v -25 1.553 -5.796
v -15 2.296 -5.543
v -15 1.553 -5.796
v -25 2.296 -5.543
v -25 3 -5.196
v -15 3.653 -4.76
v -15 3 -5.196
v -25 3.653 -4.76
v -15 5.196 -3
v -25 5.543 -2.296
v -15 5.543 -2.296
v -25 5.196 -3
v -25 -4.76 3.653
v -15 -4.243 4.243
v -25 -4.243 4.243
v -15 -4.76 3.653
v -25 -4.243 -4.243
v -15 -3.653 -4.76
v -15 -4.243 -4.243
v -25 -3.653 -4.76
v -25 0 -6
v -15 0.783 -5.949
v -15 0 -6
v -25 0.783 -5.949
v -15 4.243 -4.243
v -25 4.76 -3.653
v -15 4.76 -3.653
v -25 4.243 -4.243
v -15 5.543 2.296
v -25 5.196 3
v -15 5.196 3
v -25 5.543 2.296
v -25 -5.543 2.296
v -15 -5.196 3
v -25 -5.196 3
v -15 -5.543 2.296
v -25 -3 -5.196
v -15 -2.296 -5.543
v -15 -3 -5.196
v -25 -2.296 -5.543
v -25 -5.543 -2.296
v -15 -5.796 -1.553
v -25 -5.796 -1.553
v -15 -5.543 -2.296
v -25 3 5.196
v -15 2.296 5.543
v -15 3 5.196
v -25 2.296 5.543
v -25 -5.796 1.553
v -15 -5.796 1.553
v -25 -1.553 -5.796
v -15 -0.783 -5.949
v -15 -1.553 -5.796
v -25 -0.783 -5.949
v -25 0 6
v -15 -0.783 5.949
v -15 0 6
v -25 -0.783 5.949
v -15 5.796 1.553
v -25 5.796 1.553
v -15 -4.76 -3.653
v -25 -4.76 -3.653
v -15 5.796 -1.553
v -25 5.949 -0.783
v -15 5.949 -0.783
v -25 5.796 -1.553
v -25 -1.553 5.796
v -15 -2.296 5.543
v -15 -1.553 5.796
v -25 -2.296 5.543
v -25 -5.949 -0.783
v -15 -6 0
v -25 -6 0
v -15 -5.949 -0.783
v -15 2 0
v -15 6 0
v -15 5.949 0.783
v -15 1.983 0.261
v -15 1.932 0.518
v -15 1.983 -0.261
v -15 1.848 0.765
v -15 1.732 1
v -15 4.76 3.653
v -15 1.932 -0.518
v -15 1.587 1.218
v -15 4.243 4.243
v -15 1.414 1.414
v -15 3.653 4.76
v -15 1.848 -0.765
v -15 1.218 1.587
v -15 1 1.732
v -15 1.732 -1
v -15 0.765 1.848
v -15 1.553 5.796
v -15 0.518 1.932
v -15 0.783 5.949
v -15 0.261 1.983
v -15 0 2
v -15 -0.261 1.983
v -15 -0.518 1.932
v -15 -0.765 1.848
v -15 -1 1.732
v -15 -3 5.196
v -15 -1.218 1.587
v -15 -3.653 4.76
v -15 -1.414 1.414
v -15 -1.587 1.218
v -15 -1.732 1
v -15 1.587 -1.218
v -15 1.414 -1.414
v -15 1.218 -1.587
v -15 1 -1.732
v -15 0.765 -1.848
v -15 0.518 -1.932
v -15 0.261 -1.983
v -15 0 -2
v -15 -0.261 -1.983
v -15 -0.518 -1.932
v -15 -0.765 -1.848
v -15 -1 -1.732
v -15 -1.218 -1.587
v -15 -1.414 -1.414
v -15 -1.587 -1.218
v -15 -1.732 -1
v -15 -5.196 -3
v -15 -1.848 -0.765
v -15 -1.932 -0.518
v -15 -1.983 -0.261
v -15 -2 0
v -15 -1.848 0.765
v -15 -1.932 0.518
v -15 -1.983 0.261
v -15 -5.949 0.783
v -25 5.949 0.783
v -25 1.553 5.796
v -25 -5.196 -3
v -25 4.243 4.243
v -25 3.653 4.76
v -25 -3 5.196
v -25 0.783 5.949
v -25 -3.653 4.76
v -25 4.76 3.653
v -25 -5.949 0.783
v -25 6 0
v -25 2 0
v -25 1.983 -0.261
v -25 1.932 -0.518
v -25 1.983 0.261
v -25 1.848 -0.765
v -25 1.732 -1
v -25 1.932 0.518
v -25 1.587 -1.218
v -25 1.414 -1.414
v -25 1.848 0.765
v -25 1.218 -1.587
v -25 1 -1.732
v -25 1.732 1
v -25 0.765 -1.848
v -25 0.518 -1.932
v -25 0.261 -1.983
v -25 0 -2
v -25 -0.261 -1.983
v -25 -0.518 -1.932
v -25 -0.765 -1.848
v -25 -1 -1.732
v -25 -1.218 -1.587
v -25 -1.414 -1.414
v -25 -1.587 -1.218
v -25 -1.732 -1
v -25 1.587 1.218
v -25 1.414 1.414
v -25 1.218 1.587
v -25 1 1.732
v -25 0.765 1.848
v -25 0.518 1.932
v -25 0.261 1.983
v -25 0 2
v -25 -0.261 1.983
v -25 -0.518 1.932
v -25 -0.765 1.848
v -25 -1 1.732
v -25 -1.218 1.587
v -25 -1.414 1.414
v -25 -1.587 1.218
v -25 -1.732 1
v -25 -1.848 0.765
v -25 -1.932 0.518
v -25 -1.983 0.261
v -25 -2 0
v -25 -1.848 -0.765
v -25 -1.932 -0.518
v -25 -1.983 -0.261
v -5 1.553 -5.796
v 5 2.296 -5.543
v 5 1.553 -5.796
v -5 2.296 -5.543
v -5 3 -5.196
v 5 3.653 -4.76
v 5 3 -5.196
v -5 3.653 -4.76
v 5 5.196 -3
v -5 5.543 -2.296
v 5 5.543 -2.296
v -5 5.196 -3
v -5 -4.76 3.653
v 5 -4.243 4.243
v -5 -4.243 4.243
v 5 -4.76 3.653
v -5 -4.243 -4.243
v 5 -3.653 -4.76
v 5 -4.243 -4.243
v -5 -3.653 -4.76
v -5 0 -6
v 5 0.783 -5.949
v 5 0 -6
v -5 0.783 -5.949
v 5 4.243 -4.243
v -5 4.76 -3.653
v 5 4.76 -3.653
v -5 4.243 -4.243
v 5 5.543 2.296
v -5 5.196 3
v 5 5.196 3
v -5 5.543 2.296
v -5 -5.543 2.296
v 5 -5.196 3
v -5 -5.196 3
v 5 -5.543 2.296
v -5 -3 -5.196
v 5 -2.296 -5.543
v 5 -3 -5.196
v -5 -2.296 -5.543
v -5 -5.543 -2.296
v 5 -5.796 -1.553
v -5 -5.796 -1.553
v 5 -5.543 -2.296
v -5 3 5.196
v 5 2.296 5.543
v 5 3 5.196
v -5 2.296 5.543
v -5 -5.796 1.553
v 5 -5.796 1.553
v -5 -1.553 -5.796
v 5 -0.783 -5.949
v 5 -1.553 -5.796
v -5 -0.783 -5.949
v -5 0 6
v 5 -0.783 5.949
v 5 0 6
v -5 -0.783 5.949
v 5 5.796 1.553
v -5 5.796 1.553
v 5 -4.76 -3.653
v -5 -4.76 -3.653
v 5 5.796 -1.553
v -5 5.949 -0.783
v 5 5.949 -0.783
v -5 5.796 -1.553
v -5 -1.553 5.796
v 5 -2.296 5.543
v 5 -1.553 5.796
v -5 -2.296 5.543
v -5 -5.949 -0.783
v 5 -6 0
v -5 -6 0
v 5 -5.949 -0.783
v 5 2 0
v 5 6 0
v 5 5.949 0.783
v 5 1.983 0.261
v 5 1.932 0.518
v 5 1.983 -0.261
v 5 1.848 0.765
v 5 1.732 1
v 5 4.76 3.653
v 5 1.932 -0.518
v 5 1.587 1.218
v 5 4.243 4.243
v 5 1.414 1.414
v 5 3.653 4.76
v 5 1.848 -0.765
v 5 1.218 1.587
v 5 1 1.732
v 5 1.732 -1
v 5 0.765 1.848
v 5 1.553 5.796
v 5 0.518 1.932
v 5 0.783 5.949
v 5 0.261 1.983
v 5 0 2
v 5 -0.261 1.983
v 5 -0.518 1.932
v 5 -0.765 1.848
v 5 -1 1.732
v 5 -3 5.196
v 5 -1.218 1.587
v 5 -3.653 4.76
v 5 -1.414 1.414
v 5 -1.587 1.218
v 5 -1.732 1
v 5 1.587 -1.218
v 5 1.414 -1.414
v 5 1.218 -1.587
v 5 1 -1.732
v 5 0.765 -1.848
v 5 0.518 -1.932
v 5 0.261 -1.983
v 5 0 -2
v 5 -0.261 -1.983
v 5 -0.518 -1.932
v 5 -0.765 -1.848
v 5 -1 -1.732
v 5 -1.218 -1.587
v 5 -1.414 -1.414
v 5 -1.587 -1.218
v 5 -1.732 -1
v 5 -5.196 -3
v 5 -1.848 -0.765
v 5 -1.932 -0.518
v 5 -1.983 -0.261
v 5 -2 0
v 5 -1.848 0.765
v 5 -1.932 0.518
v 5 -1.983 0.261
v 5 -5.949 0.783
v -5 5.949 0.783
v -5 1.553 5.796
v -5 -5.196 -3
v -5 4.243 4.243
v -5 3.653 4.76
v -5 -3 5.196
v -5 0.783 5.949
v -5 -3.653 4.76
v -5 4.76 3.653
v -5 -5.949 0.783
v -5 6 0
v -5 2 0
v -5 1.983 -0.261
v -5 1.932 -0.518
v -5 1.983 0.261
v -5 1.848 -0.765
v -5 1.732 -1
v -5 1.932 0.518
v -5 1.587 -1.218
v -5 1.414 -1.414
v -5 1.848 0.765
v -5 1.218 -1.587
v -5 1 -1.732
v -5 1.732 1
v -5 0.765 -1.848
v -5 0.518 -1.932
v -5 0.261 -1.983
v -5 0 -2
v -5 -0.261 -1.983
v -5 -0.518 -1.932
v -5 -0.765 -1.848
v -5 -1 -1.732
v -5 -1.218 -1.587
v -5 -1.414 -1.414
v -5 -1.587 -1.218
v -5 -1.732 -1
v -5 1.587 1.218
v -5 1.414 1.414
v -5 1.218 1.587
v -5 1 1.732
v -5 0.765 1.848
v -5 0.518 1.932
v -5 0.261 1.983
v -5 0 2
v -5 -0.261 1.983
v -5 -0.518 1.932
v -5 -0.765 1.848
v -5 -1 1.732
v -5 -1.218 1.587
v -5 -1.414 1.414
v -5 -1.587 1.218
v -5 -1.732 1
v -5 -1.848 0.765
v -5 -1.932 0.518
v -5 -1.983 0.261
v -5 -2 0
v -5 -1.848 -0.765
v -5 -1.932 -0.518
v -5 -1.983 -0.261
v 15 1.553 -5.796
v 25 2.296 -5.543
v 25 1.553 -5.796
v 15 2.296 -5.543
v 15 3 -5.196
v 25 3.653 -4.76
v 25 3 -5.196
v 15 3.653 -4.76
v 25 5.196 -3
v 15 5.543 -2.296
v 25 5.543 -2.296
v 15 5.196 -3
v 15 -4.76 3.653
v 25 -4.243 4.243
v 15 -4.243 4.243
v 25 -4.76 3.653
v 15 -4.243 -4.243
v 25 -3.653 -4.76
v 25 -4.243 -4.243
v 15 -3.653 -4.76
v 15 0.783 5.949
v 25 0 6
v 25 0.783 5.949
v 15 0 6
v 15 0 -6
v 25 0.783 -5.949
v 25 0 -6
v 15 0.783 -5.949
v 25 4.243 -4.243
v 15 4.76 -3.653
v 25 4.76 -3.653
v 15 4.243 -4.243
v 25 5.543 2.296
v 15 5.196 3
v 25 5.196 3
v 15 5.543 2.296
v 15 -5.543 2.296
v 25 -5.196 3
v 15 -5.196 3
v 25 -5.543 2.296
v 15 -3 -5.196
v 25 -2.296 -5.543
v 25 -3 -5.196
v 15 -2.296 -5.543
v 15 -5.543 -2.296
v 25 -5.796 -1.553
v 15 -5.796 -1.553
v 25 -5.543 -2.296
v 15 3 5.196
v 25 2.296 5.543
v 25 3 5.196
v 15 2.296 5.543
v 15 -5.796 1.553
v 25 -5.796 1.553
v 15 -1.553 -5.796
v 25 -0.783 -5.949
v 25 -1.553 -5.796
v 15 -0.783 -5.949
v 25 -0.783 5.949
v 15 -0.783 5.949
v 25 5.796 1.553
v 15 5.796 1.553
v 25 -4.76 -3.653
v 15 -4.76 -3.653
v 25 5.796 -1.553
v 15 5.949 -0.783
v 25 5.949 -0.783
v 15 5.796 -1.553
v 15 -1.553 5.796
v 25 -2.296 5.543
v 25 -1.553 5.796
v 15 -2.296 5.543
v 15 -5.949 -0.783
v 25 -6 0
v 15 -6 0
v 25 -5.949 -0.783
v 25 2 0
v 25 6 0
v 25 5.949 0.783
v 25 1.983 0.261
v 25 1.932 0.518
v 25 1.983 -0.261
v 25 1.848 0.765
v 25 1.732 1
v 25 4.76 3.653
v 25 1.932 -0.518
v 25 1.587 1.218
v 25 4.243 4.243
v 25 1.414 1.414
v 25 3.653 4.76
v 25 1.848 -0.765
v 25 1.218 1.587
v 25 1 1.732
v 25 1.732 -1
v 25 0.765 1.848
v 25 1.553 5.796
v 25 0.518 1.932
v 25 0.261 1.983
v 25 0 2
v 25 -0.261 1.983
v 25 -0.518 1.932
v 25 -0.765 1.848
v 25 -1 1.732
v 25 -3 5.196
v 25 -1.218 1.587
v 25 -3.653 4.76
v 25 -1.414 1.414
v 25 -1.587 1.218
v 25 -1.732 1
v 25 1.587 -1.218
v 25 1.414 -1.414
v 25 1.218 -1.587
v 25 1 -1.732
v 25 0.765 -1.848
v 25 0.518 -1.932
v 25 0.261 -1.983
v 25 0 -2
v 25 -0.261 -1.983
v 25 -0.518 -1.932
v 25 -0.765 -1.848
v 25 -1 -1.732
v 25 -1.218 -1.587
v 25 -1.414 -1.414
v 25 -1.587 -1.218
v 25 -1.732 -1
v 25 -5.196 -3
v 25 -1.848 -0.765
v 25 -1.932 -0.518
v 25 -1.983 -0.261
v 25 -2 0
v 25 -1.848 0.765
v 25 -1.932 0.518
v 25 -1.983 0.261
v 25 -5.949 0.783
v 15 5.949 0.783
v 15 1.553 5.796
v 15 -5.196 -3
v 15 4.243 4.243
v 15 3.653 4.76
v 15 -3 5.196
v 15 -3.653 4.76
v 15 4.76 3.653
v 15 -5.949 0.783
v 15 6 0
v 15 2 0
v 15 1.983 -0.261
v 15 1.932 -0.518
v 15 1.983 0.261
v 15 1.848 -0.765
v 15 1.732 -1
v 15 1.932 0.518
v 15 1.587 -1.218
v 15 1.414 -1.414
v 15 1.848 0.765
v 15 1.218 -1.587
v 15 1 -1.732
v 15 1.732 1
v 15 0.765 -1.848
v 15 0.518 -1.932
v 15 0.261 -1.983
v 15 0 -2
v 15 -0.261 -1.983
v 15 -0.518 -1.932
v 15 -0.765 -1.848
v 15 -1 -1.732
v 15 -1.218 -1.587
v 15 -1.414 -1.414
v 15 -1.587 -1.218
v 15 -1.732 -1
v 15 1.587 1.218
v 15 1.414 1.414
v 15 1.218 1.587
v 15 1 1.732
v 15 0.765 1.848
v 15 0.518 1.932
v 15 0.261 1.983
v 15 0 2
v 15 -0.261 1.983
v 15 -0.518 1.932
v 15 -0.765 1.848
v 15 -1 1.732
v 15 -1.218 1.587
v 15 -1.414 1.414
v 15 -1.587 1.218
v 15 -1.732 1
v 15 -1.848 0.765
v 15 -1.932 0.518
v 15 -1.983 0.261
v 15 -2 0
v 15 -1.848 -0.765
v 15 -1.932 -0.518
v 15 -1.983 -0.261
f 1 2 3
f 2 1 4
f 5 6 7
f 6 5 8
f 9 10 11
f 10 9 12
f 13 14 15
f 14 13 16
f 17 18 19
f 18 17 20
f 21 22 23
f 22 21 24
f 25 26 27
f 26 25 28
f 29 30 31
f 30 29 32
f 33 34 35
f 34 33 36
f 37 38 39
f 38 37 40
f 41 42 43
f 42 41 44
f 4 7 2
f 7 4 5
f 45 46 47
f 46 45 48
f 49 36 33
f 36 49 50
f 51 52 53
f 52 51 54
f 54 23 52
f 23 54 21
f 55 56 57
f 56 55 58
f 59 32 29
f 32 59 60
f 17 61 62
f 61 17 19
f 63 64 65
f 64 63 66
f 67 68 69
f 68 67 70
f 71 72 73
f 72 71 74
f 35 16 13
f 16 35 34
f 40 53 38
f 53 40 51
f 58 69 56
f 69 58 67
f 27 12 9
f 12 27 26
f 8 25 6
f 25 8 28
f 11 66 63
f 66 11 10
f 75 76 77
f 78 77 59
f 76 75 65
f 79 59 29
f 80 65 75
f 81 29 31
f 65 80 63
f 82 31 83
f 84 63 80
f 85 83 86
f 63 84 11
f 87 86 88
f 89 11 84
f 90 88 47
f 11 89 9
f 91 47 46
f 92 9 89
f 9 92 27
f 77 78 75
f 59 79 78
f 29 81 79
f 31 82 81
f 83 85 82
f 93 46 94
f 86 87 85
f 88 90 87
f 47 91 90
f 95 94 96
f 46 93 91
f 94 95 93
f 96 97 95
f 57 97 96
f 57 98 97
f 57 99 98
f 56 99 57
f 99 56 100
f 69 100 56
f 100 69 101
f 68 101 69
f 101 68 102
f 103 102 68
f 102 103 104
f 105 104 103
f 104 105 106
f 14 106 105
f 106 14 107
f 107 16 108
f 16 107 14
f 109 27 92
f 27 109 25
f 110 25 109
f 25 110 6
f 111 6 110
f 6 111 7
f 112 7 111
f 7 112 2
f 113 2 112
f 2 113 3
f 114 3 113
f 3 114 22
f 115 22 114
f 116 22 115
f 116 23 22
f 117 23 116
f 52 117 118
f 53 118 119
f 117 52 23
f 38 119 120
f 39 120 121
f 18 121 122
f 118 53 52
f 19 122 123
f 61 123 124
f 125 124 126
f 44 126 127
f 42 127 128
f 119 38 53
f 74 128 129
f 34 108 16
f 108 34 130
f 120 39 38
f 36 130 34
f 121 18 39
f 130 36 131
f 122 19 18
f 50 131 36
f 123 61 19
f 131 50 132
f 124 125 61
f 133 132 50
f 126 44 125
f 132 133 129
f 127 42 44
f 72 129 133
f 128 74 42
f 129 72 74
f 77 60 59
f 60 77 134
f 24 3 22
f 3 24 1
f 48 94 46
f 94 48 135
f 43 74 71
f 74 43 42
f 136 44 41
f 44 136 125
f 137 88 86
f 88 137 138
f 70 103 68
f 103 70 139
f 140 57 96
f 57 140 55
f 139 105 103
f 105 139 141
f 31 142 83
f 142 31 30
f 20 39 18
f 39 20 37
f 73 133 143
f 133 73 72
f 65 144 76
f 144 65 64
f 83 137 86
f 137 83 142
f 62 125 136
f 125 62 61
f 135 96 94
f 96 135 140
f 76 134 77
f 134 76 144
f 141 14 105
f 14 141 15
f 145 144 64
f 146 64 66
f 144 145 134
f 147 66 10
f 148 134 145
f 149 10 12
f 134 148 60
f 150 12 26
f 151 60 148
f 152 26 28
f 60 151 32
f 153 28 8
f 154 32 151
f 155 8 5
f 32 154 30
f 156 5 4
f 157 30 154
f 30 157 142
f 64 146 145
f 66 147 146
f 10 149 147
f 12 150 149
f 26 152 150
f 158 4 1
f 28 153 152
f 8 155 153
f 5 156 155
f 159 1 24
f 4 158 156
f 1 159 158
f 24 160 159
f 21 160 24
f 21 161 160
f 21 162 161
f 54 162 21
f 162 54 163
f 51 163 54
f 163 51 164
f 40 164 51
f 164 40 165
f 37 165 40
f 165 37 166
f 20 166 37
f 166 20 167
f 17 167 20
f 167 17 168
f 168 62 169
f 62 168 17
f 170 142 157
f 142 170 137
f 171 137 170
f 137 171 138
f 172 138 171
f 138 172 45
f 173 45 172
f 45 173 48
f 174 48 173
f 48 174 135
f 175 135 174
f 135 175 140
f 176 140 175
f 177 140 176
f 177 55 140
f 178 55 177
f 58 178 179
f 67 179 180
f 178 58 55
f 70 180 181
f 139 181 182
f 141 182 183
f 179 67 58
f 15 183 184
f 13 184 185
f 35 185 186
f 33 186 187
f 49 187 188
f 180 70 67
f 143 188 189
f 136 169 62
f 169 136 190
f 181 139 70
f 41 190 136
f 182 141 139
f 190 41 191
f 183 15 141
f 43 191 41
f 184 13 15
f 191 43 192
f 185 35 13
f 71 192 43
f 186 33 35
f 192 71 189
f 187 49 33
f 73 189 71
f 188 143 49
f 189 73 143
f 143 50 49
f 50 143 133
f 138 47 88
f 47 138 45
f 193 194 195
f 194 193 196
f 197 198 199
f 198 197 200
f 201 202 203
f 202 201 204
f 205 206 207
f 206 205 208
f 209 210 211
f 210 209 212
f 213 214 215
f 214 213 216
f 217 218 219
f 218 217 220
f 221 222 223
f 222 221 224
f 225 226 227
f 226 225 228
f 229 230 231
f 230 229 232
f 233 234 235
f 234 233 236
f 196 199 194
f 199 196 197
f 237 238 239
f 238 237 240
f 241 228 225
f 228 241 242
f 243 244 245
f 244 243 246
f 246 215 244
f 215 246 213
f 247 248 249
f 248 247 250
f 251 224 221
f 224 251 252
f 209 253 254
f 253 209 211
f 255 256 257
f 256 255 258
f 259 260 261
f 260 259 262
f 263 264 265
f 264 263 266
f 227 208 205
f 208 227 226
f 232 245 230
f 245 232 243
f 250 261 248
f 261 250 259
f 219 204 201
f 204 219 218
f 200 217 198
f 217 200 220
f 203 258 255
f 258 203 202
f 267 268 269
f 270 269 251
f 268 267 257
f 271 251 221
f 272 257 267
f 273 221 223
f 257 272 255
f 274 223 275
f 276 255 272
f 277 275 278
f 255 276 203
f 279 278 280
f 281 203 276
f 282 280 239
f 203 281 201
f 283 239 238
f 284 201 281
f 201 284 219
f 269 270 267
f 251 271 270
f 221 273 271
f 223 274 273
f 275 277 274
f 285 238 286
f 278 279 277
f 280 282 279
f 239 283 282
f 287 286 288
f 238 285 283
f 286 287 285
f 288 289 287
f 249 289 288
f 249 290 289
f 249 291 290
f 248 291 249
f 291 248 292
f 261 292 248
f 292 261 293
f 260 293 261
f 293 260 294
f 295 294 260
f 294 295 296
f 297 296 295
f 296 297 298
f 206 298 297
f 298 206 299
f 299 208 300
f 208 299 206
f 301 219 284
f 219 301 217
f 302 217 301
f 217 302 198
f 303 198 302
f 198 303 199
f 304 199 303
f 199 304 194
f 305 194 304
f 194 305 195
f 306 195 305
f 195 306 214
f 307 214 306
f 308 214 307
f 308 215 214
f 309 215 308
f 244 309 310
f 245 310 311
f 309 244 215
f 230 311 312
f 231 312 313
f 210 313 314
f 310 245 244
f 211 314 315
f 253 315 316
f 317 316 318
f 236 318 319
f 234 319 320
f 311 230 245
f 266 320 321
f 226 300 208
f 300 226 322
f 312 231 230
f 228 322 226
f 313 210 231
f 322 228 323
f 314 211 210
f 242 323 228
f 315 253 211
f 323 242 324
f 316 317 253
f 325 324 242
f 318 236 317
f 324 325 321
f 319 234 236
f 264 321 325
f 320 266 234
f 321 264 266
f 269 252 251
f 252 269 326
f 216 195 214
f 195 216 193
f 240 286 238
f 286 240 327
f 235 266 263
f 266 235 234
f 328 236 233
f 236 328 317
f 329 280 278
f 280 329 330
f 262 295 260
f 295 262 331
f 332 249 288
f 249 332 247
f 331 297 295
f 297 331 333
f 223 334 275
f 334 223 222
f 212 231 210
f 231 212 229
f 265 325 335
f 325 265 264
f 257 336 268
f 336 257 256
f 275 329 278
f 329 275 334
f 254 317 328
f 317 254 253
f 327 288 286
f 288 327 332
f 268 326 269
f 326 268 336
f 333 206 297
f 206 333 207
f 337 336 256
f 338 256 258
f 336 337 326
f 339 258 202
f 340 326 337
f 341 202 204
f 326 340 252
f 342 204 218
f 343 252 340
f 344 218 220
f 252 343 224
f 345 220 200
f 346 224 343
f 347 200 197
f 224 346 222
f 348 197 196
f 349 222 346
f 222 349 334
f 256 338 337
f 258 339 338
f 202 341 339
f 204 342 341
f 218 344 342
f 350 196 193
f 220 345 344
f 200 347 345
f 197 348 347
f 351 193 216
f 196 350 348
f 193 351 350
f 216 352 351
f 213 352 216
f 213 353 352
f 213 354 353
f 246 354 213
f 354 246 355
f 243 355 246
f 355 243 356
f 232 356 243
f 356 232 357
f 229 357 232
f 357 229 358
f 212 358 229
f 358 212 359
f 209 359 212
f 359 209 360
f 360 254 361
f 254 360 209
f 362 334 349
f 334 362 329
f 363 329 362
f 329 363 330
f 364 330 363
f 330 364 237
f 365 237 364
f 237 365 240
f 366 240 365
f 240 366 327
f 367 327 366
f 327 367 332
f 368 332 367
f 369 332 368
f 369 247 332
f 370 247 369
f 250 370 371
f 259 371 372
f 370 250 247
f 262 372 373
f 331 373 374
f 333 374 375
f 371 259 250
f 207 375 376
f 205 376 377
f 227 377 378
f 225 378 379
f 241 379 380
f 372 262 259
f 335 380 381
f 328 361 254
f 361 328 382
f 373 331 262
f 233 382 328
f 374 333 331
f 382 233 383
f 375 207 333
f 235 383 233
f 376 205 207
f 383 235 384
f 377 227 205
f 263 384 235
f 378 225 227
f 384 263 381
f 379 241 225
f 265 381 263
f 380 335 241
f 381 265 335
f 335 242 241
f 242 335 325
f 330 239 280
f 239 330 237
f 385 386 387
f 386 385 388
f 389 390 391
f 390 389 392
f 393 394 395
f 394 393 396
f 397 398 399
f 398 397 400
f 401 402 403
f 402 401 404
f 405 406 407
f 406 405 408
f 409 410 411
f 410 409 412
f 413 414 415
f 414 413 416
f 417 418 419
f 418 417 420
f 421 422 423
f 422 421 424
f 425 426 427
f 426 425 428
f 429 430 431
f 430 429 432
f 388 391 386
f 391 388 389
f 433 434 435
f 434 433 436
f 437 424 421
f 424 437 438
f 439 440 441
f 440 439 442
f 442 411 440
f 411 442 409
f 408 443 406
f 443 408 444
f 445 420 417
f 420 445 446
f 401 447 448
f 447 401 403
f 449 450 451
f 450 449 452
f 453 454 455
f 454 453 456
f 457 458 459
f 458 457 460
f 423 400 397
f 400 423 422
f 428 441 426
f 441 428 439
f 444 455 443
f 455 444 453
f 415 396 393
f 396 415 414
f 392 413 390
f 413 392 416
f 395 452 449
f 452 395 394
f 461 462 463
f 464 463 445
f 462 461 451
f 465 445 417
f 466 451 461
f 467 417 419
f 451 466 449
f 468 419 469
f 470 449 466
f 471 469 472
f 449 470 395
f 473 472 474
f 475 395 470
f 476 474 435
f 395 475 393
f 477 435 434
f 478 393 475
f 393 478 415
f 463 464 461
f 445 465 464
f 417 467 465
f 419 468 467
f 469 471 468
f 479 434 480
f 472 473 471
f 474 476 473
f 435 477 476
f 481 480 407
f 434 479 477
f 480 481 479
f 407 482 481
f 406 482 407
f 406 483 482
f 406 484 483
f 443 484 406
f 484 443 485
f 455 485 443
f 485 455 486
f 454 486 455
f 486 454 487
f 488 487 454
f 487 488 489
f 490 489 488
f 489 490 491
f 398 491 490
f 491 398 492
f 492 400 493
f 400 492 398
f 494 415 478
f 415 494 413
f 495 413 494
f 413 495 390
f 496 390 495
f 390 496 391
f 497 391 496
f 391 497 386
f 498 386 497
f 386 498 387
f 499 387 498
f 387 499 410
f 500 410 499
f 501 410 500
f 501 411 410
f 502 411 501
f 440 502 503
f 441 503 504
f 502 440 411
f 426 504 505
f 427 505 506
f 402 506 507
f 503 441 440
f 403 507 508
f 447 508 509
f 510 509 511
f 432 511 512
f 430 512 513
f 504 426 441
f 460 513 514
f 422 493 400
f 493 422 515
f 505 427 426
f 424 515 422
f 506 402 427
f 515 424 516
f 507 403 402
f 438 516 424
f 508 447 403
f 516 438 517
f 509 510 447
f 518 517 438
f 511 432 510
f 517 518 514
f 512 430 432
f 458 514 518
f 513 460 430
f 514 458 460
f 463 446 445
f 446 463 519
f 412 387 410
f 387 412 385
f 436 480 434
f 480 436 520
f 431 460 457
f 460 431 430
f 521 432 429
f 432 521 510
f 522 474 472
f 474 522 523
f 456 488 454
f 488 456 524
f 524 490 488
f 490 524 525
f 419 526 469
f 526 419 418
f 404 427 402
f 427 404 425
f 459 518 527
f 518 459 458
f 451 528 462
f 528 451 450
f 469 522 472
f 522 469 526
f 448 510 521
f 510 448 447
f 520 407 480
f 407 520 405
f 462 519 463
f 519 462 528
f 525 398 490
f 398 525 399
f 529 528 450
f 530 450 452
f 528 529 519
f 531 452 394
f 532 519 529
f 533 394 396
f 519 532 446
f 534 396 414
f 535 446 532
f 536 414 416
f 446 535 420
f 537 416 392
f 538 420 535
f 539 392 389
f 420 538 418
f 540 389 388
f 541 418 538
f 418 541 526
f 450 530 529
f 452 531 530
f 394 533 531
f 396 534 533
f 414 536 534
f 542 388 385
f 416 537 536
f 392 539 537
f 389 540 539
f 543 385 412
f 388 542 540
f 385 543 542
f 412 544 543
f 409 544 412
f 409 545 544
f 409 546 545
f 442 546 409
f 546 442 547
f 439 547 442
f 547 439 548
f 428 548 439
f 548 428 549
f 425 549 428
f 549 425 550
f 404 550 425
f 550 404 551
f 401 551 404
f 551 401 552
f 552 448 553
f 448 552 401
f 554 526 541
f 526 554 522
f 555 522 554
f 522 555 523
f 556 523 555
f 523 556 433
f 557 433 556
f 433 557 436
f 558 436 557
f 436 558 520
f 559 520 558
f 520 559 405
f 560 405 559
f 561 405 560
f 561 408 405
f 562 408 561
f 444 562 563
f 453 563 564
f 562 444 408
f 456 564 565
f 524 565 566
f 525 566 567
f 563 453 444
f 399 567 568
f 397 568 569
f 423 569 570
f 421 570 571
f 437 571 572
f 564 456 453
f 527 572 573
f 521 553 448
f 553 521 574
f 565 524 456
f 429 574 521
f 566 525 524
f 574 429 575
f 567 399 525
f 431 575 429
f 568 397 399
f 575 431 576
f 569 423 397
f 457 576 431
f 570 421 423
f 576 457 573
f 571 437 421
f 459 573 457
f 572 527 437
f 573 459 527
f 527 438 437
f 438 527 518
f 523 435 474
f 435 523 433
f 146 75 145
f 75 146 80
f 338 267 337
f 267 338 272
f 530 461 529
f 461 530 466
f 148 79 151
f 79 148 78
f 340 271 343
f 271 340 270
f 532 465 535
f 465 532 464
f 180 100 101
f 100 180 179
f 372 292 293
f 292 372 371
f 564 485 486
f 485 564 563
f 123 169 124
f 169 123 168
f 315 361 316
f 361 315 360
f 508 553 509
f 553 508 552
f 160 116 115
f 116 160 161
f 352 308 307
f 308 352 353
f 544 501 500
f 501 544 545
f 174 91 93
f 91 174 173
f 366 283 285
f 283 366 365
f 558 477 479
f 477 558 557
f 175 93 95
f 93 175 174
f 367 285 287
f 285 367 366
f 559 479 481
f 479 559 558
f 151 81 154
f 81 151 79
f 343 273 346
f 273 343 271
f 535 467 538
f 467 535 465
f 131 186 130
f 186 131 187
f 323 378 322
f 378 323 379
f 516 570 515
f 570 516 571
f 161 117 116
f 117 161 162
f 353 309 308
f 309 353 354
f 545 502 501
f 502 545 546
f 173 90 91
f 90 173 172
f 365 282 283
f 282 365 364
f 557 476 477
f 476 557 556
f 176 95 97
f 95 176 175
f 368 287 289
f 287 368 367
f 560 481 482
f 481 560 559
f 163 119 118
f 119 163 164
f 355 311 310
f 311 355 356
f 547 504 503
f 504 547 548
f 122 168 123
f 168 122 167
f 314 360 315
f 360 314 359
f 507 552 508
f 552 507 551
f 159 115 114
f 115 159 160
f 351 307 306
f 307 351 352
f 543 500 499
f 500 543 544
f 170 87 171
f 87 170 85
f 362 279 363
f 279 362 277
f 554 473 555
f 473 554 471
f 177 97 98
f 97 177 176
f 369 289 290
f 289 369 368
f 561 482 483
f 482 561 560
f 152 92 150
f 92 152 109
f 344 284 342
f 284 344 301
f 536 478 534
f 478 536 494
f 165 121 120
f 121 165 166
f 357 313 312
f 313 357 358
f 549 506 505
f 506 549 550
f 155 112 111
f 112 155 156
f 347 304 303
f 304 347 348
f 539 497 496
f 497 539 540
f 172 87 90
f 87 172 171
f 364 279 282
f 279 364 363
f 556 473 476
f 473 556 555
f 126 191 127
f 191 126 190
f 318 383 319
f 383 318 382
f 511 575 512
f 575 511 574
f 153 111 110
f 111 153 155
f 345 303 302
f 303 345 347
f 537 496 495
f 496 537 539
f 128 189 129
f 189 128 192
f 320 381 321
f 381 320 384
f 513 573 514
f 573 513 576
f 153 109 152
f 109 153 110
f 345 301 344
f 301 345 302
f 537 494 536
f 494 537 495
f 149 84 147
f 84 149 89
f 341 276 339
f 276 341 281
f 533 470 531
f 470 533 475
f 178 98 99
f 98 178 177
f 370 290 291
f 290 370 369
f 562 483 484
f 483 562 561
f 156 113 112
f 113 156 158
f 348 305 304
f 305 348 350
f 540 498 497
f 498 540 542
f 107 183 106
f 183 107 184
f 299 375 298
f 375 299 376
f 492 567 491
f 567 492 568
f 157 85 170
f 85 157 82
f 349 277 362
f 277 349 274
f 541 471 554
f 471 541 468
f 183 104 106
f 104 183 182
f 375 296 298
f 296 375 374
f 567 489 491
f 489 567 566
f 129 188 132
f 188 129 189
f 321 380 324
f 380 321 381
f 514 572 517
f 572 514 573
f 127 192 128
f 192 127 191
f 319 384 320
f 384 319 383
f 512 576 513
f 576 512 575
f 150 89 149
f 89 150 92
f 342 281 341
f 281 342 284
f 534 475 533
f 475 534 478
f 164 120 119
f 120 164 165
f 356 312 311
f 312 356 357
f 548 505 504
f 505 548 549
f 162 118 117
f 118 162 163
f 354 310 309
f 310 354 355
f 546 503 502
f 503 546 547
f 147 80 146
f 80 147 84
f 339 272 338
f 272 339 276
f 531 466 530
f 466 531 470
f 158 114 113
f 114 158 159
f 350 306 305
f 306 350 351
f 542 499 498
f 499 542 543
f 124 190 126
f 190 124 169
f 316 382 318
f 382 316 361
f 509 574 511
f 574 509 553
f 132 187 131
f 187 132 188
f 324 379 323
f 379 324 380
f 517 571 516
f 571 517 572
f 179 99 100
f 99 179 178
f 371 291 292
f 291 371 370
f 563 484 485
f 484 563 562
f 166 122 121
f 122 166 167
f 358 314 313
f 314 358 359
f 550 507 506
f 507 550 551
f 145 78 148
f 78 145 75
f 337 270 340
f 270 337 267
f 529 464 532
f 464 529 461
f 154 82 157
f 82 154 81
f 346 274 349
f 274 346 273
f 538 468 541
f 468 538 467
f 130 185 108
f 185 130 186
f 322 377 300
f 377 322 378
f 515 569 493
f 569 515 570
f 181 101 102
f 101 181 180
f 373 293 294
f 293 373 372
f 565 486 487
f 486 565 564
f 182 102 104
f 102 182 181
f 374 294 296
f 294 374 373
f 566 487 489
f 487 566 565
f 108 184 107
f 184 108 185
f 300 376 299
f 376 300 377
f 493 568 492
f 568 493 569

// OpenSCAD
// Test-only fixture for proof.docker.test.ts (Issue #91, S3-B ticket B5).
//
// Real-engine evidence for the match-criteria ruling's "collinear
// same-diameter segments that all track the parameter count as ONE
// segmented feature and pass" (proof.ts's header comment). Three separate
// tube segments, coaxial on the X axis at FIXED positions (unlike
// evals/surface-inspection/fixture/hinge.scad's knuckles, whose Y/Z
// position is itself derived from `pin_d` — see that file's own docker
// tests) — here only the bore diameter depends on the Customizer
// parameter, so a diameter-meaning radial binding genuinely passes with
// `regions: 3` across every sample.
//
// SPDX-License-Identifier: Apache-2.0

/* [Bores] */
// Coaxial bore diameter, through all three segments (mm)
bore_d = 4; // [2:0.5:8]

// ---- Helpers (fixed constants; do not vary with bore_d) ----

segment_positions = [-20, 0, 20];
segment_len = 10;
segment_od = 12; // fixed outer diameter, comfortably above bore_d's legal max (8)

module segment(x) {
  translate([x, 0, 0])
    rotate([0, 90, 0])
      cylinder(d = segment_od, h = segment_len, center = true, $fn = 48);
}

module bore() {
  // Runs the full span (segments plus gaps) as one coaxial cut; a no-op
  // where there is no segment material.
  rotate([0, 90, 0])
    cylinder(d = bore_d, h = 200, center = true, $fn = 48);
}

difference() {
  union()
    for (x = segment_positions) segment(x);
  bore();
}
